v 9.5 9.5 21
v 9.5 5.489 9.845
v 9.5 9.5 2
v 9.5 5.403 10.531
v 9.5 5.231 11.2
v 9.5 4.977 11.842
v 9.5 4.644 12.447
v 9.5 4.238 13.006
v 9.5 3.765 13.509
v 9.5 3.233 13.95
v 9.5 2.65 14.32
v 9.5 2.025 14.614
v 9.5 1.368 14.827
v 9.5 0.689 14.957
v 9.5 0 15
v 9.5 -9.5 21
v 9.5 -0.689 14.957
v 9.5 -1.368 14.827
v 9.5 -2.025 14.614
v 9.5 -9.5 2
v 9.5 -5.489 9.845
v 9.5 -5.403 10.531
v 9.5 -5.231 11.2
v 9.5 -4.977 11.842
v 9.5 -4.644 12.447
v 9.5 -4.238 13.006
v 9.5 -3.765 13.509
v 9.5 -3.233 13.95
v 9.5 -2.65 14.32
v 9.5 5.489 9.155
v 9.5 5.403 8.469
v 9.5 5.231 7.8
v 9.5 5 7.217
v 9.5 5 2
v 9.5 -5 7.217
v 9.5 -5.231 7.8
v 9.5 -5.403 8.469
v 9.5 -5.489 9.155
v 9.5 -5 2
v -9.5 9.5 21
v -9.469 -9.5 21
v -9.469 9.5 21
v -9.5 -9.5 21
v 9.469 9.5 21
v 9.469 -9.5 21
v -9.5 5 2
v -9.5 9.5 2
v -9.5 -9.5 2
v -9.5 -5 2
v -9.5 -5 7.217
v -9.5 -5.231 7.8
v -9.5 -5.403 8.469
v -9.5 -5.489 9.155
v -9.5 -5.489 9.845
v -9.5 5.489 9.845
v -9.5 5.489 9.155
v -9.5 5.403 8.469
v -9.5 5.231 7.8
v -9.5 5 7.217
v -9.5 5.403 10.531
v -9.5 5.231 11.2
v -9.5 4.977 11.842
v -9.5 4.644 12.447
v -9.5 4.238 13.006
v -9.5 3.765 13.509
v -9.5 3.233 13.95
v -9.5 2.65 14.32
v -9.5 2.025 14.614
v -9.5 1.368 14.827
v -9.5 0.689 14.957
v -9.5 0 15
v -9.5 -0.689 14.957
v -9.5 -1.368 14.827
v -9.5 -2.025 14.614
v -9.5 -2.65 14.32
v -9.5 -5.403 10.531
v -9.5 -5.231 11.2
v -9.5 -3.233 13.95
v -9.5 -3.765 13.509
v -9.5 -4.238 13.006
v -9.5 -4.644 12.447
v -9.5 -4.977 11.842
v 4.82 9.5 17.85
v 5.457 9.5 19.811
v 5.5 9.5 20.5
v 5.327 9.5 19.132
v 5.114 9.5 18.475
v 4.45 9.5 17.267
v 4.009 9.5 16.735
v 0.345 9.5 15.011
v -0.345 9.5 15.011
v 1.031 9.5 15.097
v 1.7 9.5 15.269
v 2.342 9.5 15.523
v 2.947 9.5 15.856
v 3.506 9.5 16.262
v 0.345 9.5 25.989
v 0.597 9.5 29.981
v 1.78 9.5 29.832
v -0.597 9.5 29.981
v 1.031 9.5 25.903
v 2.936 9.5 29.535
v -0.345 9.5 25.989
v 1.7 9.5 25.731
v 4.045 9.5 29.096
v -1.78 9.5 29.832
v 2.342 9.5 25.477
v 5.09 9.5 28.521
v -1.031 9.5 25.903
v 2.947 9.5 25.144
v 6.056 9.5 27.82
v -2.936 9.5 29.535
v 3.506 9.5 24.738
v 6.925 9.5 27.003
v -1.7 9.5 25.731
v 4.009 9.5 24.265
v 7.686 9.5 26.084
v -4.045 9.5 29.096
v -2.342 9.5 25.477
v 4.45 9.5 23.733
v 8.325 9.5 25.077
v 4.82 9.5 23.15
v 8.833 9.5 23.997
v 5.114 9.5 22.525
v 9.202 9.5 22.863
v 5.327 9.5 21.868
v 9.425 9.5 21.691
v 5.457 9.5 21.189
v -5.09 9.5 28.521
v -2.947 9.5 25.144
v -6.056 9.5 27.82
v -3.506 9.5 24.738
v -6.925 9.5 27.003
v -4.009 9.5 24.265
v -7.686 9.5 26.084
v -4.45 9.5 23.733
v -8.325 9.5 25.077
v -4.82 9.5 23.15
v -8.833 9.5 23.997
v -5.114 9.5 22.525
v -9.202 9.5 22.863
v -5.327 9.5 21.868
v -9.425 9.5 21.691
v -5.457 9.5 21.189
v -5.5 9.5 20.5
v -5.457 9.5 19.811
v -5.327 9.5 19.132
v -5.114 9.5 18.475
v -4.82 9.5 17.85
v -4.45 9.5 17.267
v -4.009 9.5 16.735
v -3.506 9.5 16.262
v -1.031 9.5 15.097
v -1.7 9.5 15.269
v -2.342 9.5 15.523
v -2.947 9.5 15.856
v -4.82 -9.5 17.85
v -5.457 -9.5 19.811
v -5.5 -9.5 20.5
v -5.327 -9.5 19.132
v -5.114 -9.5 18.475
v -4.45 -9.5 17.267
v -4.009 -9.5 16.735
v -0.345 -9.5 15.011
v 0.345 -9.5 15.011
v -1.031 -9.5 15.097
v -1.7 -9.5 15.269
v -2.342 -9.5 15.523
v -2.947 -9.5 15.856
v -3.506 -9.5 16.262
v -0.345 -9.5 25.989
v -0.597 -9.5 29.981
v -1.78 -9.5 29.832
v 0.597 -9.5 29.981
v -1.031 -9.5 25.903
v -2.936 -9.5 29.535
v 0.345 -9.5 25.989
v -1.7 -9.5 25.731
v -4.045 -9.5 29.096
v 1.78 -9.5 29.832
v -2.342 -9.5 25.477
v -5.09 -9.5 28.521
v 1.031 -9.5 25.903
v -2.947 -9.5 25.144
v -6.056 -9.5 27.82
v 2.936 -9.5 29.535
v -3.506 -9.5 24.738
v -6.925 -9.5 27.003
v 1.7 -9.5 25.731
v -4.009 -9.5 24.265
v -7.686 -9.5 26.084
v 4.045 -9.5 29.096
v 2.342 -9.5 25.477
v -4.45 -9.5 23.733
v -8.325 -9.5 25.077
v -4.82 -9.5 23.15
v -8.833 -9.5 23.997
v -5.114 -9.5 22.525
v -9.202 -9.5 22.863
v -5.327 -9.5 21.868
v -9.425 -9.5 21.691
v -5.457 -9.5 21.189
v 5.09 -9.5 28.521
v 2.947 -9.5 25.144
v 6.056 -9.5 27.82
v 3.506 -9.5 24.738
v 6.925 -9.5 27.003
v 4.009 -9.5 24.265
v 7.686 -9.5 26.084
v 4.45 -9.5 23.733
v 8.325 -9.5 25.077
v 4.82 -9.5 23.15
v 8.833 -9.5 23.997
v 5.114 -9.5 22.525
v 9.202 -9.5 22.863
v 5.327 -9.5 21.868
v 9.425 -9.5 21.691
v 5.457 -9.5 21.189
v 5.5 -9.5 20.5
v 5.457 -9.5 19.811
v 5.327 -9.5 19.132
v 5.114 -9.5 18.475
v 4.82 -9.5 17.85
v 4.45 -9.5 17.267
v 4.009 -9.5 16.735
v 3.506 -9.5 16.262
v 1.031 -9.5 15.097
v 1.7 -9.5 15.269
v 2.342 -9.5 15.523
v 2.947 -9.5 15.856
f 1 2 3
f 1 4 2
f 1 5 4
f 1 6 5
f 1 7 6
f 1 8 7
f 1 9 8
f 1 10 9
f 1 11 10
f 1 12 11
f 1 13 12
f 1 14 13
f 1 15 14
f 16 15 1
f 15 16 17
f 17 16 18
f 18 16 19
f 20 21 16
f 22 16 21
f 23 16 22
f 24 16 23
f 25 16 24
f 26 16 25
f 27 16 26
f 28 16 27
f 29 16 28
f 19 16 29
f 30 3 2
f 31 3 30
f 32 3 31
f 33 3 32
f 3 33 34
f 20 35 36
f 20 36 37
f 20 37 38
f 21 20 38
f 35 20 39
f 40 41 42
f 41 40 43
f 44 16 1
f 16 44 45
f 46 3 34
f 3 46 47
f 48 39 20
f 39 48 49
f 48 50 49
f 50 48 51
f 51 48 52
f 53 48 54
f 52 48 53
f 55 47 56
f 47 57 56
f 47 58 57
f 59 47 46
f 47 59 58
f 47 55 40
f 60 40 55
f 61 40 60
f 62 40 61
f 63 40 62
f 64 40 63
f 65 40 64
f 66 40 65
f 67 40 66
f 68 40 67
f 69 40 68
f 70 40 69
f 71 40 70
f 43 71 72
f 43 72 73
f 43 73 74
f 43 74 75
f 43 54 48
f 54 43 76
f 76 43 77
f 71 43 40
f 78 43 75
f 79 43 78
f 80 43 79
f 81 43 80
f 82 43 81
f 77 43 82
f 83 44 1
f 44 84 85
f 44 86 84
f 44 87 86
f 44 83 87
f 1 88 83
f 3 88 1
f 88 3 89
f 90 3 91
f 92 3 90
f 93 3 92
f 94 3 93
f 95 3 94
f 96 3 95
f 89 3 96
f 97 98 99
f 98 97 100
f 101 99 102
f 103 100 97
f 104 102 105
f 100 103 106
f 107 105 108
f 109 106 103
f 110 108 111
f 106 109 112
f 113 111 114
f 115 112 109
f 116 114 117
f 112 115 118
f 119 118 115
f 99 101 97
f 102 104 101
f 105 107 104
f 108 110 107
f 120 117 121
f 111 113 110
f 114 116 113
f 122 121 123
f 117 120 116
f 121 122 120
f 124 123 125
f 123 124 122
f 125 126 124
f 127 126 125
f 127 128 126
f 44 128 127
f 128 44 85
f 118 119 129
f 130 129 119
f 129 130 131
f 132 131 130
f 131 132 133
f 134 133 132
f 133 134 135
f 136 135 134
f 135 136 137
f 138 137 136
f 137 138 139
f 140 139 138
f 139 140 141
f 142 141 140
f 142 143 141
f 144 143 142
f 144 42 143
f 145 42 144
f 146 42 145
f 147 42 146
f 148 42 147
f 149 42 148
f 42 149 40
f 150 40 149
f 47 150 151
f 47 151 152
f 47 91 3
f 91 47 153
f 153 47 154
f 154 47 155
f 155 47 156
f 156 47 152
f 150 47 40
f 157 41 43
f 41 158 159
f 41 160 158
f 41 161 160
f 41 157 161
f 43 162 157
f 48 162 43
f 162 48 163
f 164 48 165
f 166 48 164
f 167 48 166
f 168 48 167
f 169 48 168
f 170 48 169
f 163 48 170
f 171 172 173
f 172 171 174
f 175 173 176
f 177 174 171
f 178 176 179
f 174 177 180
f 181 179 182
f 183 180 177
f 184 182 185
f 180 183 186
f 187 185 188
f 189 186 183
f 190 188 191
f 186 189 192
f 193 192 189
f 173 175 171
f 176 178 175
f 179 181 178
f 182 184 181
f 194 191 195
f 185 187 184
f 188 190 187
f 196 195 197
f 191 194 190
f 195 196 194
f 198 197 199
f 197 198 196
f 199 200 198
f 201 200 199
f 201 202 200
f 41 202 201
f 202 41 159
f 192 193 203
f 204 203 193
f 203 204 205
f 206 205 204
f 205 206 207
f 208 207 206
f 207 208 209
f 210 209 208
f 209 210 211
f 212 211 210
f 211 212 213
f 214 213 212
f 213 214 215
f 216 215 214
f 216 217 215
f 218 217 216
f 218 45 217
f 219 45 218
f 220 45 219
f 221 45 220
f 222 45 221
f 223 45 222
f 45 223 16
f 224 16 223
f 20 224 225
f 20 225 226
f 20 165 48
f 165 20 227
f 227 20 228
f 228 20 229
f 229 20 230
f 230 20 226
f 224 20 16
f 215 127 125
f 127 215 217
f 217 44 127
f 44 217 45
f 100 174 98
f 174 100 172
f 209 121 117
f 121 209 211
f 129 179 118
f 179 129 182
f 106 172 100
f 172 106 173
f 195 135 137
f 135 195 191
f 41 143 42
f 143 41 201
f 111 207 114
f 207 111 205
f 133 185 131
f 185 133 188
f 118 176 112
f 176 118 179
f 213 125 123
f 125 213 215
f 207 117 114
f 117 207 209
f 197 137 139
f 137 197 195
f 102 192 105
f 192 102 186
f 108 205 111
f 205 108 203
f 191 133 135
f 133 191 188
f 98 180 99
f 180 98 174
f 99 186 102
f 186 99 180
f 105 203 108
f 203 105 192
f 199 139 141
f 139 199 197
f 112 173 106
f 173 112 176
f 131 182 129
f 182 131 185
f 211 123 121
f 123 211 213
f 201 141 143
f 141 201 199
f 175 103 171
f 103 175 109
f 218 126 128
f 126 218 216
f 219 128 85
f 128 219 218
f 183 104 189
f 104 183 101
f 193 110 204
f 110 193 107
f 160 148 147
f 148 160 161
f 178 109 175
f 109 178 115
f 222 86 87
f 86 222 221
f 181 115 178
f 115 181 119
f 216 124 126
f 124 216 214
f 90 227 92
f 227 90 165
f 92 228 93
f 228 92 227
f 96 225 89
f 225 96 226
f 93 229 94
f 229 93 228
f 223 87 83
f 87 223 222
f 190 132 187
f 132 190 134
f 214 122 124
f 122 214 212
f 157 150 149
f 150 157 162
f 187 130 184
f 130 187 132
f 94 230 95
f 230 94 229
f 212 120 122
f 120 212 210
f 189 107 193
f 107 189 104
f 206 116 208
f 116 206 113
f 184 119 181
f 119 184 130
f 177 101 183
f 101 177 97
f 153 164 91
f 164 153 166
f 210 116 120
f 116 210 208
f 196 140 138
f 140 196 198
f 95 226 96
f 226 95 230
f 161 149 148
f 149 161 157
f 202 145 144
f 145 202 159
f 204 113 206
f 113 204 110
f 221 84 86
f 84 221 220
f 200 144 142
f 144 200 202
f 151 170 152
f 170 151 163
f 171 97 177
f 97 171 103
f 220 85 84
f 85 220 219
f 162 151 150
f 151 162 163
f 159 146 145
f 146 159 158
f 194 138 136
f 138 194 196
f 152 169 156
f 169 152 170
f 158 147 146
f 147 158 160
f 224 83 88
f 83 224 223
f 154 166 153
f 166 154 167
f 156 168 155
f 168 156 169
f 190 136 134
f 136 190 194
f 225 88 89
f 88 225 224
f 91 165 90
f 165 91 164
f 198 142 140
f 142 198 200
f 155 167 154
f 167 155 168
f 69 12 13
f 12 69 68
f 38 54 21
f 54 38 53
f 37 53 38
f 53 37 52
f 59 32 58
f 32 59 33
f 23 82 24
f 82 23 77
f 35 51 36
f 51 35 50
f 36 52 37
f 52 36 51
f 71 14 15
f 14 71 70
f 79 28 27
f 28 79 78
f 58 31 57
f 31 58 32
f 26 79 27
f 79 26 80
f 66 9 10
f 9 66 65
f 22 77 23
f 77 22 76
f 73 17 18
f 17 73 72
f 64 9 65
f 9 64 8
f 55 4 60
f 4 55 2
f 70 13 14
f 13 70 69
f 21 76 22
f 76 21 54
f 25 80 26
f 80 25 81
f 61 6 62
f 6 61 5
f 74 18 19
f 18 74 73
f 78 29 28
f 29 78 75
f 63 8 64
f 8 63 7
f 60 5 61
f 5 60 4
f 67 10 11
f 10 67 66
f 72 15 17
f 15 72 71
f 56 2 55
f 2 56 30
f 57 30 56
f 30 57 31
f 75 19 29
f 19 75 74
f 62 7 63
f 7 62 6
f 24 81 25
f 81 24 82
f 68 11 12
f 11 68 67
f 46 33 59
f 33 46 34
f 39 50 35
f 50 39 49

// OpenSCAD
varilla=11;
pared=4;

difference(){
	union(){
	translate ([0,0,varilla/2+pared*2-2]) cube([varilla+2*pared,varilla+2*pared,varilla+pared*2],center=true);
	translate ([0,0,varilla+varilla/2+pared]) rotate([90,0,0]) cylinder(h=varilla+2*pared, d=varilla+2*pared, center=true, $fn=50);
	}

	union(){
	translate ([0,0,varilla+varilla/2+pared]) rotate([90,0,0]) cylinder(h=30, d=varilla, center=true, $fn=50);
	translate ([0,0,varilla/2+pared]) rotate([0,90,0]) cylinder(h=30, d=varilla, center=true, $fn=50);
	translate ([0,0,varilla/2-1]) cube([30,varilla-1,varilla/2+pared], center=true);
	}
}
